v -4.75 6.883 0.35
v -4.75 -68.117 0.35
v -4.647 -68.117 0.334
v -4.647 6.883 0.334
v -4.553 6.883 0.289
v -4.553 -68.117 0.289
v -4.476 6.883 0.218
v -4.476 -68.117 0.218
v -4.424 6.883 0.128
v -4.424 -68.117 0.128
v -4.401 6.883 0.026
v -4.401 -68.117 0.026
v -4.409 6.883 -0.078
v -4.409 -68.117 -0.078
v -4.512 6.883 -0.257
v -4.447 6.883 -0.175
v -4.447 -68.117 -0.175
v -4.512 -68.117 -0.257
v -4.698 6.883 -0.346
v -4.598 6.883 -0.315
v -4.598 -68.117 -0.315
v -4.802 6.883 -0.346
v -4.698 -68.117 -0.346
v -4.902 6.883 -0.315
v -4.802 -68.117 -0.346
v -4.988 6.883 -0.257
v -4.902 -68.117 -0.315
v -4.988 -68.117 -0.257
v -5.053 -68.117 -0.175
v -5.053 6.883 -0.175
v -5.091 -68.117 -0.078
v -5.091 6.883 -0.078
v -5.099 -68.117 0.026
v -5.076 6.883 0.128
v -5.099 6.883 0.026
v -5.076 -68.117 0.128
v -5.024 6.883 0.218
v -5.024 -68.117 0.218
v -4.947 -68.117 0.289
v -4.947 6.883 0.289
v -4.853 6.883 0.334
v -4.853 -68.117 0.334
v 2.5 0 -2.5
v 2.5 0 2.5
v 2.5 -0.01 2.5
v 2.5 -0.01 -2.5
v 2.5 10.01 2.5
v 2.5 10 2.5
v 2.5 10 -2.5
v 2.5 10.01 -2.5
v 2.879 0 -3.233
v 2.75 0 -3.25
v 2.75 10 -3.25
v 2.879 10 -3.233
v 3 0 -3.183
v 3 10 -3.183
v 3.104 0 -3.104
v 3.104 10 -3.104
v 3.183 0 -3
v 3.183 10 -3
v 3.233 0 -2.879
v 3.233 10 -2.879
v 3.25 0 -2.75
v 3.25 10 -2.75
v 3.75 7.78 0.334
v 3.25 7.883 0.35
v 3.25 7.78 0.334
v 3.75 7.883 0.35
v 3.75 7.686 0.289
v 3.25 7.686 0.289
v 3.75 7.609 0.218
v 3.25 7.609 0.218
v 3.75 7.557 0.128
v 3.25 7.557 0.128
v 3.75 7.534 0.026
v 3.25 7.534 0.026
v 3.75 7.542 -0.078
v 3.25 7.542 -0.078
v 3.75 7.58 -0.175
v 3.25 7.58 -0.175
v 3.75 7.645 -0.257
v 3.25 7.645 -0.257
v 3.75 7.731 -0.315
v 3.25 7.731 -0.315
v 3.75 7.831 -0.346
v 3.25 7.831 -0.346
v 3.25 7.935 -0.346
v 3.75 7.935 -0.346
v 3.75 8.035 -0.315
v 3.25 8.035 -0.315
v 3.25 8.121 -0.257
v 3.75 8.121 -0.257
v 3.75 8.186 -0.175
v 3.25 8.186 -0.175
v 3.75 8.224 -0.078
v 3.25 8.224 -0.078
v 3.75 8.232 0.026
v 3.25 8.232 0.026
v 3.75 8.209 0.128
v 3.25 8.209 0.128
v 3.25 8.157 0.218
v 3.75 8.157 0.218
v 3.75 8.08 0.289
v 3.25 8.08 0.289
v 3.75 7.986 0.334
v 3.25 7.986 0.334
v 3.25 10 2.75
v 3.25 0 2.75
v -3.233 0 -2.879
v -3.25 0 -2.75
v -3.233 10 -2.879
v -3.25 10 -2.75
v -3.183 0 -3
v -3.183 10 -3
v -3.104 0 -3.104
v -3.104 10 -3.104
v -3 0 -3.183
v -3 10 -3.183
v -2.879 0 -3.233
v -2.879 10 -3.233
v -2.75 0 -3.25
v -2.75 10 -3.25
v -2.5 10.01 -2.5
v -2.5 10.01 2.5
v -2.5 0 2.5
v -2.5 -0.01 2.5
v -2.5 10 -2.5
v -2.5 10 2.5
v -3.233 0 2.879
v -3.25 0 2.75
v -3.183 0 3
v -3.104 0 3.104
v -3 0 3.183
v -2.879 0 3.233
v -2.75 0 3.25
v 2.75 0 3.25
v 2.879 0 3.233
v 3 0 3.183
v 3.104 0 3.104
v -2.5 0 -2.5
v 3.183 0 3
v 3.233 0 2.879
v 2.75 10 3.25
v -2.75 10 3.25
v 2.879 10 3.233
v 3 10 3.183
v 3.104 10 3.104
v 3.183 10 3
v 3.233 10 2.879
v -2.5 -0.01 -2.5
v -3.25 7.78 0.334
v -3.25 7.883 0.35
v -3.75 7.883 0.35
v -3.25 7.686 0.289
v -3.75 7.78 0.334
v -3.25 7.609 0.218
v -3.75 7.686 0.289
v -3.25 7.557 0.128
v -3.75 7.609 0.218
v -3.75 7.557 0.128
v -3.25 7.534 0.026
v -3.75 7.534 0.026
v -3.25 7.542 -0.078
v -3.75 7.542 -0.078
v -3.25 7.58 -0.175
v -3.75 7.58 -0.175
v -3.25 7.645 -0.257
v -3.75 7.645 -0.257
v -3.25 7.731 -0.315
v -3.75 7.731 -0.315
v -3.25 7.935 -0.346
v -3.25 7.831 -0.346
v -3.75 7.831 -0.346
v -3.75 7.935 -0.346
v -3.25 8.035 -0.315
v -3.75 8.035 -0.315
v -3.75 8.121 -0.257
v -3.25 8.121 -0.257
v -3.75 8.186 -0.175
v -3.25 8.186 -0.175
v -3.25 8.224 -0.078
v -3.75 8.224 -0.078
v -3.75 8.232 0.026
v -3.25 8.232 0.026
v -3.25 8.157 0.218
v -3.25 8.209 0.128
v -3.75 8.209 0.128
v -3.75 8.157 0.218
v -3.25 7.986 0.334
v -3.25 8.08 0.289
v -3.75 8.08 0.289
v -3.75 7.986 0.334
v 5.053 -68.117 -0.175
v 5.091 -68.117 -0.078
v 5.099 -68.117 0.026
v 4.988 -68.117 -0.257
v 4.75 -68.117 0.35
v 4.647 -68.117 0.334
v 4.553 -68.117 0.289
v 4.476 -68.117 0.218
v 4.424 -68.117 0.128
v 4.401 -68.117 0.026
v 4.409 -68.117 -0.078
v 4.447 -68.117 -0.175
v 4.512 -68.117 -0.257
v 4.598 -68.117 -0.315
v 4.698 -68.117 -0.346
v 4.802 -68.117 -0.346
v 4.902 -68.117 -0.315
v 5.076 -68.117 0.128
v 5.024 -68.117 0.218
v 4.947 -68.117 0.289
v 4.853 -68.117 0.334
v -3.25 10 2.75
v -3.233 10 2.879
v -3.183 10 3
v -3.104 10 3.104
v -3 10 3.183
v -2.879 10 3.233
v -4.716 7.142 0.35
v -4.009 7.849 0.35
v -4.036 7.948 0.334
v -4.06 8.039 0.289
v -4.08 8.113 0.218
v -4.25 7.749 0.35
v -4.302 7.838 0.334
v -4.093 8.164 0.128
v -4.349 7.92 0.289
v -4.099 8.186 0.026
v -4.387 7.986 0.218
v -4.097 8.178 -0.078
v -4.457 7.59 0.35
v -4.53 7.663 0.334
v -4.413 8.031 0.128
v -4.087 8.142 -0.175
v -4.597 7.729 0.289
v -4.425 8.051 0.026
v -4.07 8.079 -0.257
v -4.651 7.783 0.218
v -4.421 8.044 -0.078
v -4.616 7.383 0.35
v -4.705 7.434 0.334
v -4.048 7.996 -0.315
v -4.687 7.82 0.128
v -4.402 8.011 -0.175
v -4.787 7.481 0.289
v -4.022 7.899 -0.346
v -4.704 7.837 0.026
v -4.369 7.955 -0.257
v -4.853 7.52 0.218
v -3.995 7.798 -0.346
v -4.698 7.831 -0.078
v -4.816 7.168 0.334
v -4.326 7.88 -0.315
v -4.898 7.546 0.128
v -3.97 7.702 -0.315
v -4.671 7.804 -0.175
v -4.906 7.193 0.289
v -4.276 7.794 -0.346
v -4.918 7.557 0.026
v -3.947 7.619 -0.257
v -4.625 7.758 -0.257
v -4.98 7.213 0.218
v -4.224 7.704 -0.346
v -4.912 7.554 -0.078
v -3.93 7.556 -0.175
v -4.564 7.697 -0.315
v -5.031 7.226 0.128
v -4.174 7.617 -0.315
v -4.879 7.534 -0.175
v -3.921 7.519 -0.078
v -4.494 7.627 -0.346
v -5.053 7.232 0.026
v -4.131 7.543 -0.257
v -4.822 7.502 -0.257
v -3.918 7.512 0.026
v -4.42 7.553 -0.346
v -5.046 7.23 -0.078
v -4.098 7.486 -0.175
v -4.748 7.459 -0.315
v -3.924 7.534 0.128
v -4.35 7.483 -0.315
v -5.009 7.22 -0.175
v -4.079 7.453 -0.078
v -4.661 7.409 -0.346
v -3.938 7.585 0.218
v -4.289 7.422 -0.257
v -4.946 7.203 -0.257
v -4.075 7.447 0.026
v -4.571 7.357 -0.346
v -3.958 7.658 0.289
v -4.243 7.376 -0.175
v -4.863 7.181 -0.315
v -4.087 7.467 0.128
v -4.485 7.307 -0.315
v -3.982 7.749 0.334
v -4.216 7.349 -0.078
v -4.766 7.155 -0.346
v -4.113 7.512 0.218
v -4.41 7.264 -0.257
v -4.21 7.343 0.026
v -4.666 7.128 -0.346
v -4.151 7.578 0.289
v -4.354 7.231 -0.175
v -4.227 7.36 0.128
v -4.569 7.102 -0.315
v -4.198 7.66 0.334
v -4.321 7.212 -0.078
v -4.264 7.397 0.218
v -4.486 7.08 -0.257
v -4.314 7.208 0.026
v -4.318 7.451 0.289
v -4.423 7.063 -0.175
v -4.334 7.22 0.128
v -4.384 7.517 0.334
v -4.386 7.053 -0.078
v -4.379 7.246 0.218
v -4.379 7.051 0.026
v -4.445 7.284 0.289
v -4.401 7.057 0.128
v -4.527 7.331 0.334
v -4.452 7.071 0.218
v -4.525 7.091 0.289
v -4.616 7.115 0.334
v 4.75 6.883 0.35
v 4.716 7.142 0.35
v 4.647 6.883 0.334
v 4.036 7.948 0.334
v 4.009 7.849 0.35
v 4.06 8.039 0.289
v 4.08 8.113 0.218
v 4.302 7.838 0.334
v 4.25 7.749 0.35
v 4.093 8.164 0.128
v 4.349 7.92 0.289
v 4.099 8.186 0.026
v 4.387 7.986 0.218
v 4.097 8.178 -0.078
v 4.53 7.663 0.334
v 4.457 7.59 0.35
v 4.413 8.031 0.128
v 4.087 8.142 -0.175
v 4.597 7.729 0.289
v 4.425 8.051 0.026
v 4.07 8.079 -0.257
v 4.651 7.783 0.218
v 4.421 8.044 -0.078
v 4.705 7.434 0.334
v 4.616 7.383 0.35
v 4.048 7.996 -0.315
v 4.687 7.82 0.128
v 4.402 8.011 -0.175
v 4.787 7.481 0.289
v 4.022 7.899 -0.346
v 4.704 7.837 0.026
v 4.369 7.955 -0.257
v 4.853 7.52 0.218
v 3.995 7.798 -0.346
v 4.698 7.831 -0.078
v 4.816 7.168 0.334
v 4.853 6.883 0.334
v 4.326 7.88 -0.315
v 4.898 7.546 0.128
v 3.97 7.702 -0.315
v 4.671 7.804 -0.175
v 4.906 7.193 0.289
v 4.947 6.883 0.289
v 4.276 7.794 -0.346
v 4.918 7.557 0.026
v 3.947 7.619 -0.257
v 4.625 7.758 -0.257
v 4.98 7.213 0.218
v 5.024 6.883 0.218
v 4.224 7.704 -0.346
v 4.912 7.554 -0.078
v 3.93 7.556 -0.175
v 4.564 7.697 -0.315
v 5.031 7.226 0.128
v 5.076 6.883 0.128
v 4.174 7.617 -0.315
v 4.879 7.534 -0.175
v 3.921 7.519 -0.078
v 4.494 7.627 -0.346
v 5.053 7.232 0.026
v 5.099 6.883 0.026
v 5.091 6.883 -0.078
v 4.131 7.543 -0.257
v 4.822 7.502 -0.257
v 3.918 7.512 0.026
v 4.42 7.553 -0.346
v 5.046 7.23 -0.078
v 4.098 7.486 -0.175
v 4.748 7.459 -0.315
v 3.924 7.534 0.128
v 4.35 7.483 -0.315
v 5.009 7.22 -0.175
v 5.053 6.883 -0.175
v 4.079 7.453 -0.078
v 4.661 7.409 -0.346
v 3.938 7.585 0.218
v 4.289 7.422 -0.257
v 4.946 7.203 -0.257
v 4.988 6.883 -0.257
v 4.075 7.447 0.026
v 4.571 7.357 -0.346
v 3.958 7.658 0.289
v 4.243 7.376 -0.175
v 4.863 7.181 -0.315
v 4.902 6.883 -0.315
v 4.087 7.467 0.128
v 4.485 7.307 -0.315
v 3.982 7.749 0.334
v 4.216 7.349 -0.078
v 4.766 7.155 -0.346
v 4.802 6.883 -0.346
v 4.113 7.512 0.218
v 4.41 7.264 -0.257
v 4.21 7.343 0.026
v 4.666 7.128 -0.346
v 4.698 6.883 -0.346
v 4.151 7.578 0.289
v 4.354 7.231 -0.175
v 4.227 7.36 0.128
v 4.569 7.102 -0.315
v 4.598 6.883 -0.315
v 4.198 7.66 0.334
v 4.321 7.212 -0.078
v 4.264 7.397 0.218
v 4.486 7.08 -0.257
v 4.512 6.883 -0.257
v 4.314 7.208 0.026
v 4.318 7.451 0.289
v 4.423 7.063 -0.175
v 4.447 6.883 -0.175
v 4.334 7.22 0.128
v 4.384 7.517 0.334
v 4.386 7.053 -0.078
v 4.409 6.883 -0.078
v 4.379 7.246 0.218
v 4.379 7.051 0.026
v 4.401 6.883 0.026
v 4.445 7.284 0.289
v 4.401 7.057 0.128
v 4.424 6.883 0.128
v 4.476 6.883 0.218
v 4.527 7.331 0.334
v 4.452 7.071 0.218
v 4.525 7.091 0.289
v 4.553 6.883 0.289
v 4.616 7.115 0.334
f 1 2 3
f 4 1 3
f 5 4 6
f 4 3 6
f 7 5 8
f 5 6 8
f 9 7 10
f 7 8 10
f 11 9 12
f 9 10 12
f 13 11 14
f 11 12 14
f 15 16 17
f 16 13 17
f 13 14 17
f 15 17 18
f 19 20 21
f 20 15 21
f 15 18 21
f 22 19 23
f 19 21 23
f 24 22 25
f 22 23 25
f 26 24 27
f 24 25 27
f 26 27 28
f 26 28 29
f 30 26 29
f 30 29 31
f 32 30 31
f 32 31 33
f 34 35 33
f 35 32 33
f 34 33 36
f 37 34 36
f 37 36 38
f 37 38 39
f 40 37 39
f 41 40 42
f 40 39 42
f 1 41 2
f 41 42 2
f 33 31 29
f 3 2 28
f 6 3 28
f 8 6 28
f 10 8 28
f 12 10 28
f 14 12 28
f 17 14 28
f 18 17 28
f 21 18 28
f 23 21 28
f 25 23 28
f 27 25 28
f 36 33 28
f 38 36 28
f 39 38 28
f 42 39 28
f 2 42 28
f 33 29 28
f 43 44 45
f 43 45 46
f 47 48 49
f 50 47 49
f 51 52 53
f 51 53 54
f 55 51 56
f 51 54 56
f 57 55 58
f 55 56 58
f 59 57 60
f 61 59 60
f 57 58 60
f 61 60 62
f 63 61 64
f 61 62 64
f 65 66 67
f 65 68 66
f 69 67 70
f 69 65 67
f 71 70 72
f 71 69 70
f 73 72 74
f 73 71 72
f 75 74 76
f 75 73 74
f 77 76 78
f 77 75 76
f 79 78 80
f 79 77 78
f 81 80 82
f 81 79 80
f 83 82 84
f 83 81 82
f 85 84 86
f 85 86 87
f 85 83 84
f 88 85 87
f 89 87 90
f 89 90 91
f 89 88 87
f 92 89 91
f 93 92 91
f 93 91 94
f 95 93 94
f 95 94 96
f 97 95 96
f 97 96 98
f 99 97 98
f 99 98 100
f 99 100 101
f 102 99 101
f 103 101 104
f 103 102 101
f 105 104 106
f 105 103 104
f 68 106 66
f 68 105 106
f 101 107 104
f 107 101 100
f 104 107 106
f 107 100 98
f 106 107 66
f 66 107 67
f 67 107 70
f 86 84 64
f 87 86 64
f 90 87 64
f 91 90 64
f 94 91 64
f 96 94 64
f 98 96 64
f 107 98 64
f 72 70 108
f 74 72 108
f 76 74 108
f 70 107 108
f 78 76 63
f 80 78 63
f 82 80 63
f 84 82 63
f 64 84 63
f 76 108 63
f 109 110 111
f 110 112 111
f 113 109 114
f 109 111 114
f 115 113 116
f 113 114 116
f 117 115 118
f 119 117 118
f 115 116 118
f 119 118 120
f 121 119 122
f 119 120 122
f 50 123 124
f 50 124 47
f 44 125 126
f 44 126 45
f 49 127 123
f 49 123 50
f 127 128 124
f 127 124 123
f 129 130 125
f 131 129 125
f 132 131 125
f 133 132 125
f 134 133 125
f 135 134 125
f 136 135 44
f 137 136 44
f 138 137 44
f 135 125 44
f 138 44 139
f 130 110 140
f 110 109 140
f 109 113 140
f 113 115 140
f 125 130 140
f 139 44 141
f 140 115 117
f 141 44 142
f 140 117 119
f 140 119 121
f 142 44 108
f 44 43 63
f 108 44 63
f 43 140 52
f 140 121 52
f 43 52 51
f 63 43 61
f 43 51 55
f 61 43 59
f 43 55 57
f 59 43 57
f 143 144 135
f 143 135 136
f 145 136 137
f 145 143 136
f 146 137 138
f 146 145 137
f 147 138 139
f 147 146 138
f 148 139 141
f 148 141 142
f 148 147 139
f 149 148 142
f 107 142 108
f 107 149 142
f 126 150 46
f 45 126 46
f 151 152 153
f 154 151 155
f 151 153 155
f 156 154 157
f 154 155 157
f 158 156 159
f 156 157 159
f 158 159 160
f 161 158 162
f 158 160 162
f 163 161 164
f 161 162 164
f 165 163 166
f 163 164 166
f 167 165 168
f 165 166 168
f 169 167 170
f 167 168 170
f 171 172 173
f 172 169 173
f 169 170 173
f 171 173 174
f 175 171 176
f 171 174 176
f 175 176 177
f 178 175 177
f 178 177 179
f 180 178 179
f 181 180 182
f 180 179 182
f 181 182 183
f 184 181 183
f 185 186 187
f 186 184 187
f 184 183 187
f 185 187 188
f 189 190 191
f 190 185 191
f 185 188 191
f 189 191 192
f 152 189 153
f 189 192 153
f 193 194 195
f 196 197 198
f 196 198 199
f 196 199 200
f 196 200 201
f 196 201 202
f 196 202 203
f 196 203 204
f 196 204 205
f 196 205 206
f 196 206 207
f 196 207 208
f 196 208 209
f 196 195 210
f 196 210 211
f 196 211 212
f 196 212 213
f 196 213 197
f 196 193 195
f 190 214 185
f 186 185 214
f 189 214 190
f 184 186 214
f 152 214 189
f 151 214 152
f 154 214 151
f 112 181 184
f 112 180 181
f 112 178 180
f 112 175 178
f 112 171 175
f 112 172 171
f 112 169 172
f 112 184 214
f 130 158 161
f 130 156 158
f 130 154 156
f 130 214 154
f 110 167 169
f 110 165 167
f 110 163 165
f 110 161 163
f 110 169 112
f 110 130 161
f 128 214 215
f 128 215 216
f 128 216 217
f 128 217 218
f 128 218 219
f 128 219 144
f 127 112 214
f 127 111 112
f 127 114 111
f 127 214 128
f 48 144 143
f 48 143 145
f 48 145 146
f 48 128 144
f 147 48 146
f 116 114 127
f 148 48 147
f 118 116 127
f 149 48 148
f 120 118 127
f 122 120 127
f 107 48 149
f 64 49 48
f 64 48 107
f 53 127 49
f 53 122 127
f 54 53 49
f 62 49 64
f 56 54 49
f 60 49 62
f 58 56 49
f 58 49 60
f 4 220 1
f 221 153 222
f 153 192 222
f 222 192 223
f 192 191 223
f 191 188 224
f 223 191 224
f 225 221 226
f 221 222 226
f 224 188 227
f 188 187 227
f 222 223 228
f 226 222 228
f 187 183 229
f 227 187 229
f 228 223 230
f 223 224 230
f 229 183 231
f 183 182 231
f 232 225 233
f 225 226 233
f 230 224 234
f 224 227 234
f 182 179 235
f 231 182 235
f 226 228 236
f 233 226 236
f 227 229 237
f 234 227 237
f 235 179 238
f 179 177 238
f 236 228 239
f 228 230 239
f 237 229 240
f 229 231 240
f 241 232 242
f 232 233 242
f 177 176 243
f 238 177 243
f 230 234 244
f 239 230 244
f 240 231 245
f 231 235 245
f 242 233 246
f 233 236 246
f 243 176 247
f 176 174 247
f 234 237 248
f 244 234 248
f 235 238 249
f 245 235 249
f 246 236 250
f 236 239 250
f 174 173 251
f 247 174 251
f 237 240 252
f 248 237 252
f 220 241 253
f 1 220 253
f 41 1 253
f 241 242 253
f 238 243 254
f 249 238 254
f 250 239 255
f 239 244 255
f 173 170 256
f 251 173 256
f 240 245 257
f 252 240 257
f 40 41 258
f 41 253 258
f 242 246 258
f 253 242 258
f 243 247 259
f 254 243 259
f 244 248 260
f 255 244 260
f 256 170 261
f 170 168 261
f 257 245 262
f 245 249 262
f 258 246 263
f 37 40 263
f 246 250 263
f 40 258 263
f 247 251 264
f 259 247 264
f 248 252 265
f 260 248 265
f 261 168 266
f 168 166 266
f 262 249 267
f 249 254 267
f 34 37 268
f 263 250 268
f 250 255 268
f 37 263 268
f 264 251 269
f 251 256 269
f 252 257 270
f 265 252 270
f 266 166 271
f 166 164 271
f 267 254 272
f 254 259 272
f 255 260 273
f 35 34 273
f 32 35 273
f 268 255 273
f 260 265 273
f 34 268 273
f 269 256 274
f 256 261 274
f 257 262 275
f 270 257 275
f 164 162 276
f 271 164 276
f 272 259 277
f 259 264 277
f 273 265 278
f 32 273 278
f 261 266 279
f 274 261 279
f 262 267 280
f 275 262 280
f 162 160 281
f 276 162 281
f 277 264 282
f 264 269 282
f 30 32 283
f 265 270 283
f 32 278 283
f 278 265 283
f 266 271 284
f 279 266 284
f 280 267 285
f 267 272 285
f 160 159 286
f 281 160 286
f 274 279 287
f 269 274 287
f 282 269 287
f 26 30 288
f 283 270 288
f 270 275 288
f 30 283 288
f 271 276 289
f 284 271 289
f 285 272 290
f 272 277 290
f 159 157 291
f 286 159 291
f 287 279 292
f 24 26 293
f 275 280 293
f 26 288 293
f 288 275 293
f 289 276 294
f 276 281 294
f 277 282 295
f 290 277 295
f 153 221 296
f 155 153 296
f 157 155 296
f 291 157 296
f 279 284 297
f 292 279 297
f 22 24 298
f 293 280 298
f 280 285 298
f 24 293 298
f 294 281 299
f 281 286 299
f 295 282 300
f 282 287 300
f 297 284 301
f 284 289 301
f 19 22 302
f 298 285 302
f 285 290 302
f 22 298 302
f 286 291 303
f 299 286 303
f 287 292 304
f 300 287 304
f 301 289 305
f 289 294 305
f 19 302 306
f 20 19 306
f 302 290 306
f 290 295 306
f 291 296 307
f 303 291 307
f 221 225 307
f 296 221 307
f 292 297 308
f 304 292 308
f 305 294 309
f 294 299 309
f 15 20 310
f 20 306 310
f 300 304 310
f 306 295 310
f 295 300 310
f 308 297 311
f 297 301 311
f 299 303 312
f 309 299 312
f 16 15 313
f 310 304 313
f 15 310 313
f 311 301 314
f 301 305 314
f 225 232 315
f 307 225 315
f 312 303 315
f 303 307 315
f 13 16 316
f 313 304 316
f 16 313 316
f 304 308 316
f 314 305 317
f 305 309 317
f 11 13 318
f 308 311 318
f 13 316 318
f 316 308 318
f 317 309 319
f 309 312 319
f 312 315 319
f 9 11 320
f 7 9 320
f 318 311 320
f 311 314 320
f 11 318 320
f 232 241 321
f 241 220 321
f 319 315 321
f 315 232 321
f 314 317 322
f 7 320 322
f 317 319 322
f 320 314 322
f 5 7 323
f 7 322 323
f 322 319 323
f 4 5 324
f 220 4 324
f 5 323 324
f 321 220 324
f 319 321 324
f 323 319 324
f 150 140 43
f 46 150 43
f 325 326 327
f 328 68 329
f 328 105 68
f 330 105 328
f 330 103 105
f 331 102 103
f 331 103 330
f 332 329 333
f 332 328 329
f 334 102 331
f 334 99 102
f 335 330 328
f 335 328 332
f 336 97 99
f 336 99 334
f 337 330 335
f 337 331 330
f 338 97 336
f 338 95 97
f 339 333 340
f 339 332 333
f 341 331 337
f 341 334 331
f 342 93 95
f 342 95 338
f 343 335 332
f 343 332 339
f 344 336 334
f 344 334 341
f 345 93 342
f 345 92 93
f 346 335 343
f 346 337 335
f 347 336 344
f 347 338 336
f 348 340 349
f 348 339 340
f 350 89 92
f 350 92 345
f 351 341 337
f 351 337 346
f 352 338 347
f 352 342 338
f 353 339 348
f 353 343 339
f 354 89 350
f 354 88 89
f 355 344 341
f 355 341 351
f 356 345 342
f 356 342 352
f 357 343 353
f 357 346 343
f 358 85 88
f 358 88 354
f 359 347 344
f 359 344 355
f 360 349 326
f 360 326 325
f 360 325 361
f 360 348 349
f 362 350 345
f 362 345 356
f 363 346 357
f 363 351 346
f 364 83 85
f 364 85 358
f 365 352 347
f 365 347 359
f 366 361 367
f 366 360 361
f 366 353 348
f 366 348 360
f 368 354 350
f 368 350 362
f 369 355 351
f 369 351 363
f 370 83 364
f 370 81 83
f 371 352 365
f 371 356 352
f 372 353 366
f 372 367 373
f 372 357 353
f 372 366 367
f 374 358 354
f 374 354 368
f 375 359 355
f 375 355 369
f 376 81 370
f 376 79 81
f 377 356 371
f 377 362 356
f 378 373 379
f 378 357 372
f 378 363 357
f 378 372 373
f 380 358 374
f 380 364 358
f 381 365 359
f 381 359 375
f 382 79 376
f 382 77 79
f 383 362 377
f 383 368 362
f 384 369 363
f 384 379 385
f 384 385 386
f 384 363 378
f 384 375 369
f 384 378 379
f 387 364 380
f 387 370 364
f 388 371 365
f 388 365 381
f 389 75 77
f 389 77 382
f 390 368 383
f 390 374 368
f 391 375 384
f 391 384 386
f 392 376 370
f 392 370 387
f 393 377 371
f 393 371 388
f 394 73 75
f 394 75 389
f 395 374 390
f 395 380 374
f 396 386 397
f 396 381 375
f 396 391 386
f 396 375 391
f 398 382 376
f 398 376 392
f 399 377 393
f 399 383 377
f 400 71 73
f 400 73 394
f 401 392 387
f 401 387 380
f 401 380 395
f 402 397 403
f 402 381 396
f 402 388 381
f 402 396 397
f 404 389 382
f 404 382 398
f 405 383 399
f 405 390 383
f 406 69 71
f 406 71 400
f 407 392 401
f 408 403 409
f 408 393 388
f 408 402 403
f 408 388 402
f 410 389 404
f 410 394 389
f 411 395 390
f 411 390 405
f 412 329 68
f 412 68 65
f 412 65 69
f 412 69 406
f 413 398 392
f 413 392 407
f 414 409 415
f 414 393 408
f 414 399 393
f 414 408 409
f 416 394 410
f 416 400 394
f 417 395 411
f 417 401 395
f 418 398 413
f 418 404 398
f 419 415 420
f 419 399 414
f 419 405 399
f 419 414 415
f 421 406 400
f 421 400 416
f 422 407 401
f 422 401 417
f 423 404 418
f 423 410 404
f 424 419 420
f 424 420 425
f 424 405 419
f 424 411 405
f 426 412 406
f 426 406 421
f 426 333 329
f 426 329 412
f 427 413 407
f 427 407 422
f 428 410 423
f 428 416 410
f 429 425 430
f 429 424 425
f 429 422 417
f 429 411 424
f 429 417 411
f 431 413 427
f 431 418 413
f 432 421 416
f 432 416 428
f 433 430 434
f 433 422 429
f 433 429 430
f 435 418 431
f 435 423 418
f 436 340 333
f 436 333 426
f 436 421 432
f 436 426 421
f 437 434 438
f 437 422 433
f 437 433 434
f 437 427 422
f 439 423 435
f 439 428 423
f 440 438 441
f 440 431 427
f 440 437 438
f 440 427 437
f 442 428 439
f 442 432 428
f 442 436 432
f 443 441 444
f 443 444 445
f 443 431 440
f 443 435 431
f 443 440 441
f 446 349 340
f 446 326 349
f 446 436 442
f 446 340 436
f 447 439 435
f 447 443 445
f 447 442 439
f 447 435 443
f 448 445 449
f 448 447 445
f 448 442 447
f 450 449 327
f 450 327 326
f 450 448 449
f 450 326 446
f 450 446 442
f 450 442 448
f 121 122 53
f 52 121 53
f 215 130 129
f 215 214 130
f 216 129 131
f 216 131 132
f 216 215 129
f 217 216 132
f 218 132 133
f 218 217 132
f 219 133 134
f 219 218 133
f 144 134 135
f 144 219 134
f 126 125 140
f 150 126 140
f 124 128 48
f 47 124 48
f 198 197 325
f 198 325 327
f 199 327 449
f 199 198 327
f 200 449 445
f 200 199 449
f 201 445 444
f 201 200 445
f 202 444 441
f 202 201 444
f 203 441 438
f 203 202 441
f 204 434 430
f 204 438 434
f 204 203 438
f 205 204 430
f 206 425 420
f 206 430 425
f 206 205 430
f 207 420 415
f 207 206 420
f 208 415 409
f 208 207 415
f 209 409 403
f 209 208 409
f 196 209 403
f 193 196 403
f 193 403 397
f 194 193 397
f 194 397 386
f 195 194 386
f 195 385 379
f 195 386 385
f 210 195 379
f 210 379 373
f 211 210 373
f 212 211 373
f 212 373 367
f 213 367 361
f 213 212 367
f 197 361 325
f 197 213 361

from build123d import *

# Parameters (mm, degrees)
SKETCH1_W                = 6.5
SKETCH1_H                = 6.5
BOSS_EXTRUDE1_DEPTH      = 10
SKETCH2_W                = 5
SKETCH2_H                = 5
BOSS_EXTRUDE2_DEPTH      = 10.01
BOSS_EXTRUDE2_DEPTH_BACK = 0.01
SWEEP2_PROFILE_R         = 0.35
FILLET2_R                = 0.5


with BuildPart() as part:
    # Sketch1 → Boss-Extrude1 (new body)
    with BuildSketch(Plane(origin=(0, 0, 0), x_dir=(1, 0, 0), z_dir=(0, 1, 0))):
        Rectangle(SKETCH1_W, SKETCH1_H)
    boss_extrude1 = extrude(amount=BOSS_EXTRUDE1_DEPTH)

    # Sketch2 → Boss-Extrude2 (add, two sides)
    with BuildSketch(Plane(origin=(0, 0, 0), x_dir=(1, 0, 0), z_dir=(0, 1, 0))) as boss_extrude2_sk:
        Rectangle(SKETCH2_W, SKETCH2_H)
    extrude(amount=BOSS_EXTRUDE2_DEPTH)
    extrude(boss_extrude2_sk.sketch, amount=-BOSS_EXTRUDE2_DEPTH_BACK)

    # Sweep2: sweep along a path in Sketch4
    with BuildLine(Plane.XY) as sweep2_path:
        Line((3.2, 7.882896733), (3.25, 7.882896733))
        Line((3.25, 7.882896733), (3.75, 7.882896733))
        ThreePointArc((3.75, 7.882896733), (4.457106781, 7.590003514), (4.75, 6.882896733))
        Line((4.75, 6.882896733), (4.75, -68.117103267))
    # Sweep2 profile (on start of the path) → Sweep2 (sweep)
    with BuildSketch(Plane(origin=(3.2, 7.882896733, 0), x_dir=(0, 0, 1), z_dir=(1, 0, 0))):
        Circle(SWEEP2_PROFILE_R)
    sweep2 = sweep(path=sweep2_path.line)

    # Mirror1: Boss-Extrude1, Sweep2 across plane
    add(boss_extrude1.mirror(Plane(origin=(0, 0, 0), x_dir=(0, 0, 1), z_dir=(1, 0, 0))))
    add(sweep2.mirror(Plane(origin=(0, 0, 0), x_dir=(0, 0, 1), z_dir=(1, 0, 0))))

    # Fillet2
    fillet2_edges = [part.edges().sort_by_distance(p)[0] for p in [
        (3.25, 5, 3.25),
        (-3.25, 5, 3.25),
        (-3.25, 5, -3.25),
        (3.25, 5, -3.25),
    ]]
    fillet(fillet2_edges, radius=FILLET2_R)


solid = part.part
